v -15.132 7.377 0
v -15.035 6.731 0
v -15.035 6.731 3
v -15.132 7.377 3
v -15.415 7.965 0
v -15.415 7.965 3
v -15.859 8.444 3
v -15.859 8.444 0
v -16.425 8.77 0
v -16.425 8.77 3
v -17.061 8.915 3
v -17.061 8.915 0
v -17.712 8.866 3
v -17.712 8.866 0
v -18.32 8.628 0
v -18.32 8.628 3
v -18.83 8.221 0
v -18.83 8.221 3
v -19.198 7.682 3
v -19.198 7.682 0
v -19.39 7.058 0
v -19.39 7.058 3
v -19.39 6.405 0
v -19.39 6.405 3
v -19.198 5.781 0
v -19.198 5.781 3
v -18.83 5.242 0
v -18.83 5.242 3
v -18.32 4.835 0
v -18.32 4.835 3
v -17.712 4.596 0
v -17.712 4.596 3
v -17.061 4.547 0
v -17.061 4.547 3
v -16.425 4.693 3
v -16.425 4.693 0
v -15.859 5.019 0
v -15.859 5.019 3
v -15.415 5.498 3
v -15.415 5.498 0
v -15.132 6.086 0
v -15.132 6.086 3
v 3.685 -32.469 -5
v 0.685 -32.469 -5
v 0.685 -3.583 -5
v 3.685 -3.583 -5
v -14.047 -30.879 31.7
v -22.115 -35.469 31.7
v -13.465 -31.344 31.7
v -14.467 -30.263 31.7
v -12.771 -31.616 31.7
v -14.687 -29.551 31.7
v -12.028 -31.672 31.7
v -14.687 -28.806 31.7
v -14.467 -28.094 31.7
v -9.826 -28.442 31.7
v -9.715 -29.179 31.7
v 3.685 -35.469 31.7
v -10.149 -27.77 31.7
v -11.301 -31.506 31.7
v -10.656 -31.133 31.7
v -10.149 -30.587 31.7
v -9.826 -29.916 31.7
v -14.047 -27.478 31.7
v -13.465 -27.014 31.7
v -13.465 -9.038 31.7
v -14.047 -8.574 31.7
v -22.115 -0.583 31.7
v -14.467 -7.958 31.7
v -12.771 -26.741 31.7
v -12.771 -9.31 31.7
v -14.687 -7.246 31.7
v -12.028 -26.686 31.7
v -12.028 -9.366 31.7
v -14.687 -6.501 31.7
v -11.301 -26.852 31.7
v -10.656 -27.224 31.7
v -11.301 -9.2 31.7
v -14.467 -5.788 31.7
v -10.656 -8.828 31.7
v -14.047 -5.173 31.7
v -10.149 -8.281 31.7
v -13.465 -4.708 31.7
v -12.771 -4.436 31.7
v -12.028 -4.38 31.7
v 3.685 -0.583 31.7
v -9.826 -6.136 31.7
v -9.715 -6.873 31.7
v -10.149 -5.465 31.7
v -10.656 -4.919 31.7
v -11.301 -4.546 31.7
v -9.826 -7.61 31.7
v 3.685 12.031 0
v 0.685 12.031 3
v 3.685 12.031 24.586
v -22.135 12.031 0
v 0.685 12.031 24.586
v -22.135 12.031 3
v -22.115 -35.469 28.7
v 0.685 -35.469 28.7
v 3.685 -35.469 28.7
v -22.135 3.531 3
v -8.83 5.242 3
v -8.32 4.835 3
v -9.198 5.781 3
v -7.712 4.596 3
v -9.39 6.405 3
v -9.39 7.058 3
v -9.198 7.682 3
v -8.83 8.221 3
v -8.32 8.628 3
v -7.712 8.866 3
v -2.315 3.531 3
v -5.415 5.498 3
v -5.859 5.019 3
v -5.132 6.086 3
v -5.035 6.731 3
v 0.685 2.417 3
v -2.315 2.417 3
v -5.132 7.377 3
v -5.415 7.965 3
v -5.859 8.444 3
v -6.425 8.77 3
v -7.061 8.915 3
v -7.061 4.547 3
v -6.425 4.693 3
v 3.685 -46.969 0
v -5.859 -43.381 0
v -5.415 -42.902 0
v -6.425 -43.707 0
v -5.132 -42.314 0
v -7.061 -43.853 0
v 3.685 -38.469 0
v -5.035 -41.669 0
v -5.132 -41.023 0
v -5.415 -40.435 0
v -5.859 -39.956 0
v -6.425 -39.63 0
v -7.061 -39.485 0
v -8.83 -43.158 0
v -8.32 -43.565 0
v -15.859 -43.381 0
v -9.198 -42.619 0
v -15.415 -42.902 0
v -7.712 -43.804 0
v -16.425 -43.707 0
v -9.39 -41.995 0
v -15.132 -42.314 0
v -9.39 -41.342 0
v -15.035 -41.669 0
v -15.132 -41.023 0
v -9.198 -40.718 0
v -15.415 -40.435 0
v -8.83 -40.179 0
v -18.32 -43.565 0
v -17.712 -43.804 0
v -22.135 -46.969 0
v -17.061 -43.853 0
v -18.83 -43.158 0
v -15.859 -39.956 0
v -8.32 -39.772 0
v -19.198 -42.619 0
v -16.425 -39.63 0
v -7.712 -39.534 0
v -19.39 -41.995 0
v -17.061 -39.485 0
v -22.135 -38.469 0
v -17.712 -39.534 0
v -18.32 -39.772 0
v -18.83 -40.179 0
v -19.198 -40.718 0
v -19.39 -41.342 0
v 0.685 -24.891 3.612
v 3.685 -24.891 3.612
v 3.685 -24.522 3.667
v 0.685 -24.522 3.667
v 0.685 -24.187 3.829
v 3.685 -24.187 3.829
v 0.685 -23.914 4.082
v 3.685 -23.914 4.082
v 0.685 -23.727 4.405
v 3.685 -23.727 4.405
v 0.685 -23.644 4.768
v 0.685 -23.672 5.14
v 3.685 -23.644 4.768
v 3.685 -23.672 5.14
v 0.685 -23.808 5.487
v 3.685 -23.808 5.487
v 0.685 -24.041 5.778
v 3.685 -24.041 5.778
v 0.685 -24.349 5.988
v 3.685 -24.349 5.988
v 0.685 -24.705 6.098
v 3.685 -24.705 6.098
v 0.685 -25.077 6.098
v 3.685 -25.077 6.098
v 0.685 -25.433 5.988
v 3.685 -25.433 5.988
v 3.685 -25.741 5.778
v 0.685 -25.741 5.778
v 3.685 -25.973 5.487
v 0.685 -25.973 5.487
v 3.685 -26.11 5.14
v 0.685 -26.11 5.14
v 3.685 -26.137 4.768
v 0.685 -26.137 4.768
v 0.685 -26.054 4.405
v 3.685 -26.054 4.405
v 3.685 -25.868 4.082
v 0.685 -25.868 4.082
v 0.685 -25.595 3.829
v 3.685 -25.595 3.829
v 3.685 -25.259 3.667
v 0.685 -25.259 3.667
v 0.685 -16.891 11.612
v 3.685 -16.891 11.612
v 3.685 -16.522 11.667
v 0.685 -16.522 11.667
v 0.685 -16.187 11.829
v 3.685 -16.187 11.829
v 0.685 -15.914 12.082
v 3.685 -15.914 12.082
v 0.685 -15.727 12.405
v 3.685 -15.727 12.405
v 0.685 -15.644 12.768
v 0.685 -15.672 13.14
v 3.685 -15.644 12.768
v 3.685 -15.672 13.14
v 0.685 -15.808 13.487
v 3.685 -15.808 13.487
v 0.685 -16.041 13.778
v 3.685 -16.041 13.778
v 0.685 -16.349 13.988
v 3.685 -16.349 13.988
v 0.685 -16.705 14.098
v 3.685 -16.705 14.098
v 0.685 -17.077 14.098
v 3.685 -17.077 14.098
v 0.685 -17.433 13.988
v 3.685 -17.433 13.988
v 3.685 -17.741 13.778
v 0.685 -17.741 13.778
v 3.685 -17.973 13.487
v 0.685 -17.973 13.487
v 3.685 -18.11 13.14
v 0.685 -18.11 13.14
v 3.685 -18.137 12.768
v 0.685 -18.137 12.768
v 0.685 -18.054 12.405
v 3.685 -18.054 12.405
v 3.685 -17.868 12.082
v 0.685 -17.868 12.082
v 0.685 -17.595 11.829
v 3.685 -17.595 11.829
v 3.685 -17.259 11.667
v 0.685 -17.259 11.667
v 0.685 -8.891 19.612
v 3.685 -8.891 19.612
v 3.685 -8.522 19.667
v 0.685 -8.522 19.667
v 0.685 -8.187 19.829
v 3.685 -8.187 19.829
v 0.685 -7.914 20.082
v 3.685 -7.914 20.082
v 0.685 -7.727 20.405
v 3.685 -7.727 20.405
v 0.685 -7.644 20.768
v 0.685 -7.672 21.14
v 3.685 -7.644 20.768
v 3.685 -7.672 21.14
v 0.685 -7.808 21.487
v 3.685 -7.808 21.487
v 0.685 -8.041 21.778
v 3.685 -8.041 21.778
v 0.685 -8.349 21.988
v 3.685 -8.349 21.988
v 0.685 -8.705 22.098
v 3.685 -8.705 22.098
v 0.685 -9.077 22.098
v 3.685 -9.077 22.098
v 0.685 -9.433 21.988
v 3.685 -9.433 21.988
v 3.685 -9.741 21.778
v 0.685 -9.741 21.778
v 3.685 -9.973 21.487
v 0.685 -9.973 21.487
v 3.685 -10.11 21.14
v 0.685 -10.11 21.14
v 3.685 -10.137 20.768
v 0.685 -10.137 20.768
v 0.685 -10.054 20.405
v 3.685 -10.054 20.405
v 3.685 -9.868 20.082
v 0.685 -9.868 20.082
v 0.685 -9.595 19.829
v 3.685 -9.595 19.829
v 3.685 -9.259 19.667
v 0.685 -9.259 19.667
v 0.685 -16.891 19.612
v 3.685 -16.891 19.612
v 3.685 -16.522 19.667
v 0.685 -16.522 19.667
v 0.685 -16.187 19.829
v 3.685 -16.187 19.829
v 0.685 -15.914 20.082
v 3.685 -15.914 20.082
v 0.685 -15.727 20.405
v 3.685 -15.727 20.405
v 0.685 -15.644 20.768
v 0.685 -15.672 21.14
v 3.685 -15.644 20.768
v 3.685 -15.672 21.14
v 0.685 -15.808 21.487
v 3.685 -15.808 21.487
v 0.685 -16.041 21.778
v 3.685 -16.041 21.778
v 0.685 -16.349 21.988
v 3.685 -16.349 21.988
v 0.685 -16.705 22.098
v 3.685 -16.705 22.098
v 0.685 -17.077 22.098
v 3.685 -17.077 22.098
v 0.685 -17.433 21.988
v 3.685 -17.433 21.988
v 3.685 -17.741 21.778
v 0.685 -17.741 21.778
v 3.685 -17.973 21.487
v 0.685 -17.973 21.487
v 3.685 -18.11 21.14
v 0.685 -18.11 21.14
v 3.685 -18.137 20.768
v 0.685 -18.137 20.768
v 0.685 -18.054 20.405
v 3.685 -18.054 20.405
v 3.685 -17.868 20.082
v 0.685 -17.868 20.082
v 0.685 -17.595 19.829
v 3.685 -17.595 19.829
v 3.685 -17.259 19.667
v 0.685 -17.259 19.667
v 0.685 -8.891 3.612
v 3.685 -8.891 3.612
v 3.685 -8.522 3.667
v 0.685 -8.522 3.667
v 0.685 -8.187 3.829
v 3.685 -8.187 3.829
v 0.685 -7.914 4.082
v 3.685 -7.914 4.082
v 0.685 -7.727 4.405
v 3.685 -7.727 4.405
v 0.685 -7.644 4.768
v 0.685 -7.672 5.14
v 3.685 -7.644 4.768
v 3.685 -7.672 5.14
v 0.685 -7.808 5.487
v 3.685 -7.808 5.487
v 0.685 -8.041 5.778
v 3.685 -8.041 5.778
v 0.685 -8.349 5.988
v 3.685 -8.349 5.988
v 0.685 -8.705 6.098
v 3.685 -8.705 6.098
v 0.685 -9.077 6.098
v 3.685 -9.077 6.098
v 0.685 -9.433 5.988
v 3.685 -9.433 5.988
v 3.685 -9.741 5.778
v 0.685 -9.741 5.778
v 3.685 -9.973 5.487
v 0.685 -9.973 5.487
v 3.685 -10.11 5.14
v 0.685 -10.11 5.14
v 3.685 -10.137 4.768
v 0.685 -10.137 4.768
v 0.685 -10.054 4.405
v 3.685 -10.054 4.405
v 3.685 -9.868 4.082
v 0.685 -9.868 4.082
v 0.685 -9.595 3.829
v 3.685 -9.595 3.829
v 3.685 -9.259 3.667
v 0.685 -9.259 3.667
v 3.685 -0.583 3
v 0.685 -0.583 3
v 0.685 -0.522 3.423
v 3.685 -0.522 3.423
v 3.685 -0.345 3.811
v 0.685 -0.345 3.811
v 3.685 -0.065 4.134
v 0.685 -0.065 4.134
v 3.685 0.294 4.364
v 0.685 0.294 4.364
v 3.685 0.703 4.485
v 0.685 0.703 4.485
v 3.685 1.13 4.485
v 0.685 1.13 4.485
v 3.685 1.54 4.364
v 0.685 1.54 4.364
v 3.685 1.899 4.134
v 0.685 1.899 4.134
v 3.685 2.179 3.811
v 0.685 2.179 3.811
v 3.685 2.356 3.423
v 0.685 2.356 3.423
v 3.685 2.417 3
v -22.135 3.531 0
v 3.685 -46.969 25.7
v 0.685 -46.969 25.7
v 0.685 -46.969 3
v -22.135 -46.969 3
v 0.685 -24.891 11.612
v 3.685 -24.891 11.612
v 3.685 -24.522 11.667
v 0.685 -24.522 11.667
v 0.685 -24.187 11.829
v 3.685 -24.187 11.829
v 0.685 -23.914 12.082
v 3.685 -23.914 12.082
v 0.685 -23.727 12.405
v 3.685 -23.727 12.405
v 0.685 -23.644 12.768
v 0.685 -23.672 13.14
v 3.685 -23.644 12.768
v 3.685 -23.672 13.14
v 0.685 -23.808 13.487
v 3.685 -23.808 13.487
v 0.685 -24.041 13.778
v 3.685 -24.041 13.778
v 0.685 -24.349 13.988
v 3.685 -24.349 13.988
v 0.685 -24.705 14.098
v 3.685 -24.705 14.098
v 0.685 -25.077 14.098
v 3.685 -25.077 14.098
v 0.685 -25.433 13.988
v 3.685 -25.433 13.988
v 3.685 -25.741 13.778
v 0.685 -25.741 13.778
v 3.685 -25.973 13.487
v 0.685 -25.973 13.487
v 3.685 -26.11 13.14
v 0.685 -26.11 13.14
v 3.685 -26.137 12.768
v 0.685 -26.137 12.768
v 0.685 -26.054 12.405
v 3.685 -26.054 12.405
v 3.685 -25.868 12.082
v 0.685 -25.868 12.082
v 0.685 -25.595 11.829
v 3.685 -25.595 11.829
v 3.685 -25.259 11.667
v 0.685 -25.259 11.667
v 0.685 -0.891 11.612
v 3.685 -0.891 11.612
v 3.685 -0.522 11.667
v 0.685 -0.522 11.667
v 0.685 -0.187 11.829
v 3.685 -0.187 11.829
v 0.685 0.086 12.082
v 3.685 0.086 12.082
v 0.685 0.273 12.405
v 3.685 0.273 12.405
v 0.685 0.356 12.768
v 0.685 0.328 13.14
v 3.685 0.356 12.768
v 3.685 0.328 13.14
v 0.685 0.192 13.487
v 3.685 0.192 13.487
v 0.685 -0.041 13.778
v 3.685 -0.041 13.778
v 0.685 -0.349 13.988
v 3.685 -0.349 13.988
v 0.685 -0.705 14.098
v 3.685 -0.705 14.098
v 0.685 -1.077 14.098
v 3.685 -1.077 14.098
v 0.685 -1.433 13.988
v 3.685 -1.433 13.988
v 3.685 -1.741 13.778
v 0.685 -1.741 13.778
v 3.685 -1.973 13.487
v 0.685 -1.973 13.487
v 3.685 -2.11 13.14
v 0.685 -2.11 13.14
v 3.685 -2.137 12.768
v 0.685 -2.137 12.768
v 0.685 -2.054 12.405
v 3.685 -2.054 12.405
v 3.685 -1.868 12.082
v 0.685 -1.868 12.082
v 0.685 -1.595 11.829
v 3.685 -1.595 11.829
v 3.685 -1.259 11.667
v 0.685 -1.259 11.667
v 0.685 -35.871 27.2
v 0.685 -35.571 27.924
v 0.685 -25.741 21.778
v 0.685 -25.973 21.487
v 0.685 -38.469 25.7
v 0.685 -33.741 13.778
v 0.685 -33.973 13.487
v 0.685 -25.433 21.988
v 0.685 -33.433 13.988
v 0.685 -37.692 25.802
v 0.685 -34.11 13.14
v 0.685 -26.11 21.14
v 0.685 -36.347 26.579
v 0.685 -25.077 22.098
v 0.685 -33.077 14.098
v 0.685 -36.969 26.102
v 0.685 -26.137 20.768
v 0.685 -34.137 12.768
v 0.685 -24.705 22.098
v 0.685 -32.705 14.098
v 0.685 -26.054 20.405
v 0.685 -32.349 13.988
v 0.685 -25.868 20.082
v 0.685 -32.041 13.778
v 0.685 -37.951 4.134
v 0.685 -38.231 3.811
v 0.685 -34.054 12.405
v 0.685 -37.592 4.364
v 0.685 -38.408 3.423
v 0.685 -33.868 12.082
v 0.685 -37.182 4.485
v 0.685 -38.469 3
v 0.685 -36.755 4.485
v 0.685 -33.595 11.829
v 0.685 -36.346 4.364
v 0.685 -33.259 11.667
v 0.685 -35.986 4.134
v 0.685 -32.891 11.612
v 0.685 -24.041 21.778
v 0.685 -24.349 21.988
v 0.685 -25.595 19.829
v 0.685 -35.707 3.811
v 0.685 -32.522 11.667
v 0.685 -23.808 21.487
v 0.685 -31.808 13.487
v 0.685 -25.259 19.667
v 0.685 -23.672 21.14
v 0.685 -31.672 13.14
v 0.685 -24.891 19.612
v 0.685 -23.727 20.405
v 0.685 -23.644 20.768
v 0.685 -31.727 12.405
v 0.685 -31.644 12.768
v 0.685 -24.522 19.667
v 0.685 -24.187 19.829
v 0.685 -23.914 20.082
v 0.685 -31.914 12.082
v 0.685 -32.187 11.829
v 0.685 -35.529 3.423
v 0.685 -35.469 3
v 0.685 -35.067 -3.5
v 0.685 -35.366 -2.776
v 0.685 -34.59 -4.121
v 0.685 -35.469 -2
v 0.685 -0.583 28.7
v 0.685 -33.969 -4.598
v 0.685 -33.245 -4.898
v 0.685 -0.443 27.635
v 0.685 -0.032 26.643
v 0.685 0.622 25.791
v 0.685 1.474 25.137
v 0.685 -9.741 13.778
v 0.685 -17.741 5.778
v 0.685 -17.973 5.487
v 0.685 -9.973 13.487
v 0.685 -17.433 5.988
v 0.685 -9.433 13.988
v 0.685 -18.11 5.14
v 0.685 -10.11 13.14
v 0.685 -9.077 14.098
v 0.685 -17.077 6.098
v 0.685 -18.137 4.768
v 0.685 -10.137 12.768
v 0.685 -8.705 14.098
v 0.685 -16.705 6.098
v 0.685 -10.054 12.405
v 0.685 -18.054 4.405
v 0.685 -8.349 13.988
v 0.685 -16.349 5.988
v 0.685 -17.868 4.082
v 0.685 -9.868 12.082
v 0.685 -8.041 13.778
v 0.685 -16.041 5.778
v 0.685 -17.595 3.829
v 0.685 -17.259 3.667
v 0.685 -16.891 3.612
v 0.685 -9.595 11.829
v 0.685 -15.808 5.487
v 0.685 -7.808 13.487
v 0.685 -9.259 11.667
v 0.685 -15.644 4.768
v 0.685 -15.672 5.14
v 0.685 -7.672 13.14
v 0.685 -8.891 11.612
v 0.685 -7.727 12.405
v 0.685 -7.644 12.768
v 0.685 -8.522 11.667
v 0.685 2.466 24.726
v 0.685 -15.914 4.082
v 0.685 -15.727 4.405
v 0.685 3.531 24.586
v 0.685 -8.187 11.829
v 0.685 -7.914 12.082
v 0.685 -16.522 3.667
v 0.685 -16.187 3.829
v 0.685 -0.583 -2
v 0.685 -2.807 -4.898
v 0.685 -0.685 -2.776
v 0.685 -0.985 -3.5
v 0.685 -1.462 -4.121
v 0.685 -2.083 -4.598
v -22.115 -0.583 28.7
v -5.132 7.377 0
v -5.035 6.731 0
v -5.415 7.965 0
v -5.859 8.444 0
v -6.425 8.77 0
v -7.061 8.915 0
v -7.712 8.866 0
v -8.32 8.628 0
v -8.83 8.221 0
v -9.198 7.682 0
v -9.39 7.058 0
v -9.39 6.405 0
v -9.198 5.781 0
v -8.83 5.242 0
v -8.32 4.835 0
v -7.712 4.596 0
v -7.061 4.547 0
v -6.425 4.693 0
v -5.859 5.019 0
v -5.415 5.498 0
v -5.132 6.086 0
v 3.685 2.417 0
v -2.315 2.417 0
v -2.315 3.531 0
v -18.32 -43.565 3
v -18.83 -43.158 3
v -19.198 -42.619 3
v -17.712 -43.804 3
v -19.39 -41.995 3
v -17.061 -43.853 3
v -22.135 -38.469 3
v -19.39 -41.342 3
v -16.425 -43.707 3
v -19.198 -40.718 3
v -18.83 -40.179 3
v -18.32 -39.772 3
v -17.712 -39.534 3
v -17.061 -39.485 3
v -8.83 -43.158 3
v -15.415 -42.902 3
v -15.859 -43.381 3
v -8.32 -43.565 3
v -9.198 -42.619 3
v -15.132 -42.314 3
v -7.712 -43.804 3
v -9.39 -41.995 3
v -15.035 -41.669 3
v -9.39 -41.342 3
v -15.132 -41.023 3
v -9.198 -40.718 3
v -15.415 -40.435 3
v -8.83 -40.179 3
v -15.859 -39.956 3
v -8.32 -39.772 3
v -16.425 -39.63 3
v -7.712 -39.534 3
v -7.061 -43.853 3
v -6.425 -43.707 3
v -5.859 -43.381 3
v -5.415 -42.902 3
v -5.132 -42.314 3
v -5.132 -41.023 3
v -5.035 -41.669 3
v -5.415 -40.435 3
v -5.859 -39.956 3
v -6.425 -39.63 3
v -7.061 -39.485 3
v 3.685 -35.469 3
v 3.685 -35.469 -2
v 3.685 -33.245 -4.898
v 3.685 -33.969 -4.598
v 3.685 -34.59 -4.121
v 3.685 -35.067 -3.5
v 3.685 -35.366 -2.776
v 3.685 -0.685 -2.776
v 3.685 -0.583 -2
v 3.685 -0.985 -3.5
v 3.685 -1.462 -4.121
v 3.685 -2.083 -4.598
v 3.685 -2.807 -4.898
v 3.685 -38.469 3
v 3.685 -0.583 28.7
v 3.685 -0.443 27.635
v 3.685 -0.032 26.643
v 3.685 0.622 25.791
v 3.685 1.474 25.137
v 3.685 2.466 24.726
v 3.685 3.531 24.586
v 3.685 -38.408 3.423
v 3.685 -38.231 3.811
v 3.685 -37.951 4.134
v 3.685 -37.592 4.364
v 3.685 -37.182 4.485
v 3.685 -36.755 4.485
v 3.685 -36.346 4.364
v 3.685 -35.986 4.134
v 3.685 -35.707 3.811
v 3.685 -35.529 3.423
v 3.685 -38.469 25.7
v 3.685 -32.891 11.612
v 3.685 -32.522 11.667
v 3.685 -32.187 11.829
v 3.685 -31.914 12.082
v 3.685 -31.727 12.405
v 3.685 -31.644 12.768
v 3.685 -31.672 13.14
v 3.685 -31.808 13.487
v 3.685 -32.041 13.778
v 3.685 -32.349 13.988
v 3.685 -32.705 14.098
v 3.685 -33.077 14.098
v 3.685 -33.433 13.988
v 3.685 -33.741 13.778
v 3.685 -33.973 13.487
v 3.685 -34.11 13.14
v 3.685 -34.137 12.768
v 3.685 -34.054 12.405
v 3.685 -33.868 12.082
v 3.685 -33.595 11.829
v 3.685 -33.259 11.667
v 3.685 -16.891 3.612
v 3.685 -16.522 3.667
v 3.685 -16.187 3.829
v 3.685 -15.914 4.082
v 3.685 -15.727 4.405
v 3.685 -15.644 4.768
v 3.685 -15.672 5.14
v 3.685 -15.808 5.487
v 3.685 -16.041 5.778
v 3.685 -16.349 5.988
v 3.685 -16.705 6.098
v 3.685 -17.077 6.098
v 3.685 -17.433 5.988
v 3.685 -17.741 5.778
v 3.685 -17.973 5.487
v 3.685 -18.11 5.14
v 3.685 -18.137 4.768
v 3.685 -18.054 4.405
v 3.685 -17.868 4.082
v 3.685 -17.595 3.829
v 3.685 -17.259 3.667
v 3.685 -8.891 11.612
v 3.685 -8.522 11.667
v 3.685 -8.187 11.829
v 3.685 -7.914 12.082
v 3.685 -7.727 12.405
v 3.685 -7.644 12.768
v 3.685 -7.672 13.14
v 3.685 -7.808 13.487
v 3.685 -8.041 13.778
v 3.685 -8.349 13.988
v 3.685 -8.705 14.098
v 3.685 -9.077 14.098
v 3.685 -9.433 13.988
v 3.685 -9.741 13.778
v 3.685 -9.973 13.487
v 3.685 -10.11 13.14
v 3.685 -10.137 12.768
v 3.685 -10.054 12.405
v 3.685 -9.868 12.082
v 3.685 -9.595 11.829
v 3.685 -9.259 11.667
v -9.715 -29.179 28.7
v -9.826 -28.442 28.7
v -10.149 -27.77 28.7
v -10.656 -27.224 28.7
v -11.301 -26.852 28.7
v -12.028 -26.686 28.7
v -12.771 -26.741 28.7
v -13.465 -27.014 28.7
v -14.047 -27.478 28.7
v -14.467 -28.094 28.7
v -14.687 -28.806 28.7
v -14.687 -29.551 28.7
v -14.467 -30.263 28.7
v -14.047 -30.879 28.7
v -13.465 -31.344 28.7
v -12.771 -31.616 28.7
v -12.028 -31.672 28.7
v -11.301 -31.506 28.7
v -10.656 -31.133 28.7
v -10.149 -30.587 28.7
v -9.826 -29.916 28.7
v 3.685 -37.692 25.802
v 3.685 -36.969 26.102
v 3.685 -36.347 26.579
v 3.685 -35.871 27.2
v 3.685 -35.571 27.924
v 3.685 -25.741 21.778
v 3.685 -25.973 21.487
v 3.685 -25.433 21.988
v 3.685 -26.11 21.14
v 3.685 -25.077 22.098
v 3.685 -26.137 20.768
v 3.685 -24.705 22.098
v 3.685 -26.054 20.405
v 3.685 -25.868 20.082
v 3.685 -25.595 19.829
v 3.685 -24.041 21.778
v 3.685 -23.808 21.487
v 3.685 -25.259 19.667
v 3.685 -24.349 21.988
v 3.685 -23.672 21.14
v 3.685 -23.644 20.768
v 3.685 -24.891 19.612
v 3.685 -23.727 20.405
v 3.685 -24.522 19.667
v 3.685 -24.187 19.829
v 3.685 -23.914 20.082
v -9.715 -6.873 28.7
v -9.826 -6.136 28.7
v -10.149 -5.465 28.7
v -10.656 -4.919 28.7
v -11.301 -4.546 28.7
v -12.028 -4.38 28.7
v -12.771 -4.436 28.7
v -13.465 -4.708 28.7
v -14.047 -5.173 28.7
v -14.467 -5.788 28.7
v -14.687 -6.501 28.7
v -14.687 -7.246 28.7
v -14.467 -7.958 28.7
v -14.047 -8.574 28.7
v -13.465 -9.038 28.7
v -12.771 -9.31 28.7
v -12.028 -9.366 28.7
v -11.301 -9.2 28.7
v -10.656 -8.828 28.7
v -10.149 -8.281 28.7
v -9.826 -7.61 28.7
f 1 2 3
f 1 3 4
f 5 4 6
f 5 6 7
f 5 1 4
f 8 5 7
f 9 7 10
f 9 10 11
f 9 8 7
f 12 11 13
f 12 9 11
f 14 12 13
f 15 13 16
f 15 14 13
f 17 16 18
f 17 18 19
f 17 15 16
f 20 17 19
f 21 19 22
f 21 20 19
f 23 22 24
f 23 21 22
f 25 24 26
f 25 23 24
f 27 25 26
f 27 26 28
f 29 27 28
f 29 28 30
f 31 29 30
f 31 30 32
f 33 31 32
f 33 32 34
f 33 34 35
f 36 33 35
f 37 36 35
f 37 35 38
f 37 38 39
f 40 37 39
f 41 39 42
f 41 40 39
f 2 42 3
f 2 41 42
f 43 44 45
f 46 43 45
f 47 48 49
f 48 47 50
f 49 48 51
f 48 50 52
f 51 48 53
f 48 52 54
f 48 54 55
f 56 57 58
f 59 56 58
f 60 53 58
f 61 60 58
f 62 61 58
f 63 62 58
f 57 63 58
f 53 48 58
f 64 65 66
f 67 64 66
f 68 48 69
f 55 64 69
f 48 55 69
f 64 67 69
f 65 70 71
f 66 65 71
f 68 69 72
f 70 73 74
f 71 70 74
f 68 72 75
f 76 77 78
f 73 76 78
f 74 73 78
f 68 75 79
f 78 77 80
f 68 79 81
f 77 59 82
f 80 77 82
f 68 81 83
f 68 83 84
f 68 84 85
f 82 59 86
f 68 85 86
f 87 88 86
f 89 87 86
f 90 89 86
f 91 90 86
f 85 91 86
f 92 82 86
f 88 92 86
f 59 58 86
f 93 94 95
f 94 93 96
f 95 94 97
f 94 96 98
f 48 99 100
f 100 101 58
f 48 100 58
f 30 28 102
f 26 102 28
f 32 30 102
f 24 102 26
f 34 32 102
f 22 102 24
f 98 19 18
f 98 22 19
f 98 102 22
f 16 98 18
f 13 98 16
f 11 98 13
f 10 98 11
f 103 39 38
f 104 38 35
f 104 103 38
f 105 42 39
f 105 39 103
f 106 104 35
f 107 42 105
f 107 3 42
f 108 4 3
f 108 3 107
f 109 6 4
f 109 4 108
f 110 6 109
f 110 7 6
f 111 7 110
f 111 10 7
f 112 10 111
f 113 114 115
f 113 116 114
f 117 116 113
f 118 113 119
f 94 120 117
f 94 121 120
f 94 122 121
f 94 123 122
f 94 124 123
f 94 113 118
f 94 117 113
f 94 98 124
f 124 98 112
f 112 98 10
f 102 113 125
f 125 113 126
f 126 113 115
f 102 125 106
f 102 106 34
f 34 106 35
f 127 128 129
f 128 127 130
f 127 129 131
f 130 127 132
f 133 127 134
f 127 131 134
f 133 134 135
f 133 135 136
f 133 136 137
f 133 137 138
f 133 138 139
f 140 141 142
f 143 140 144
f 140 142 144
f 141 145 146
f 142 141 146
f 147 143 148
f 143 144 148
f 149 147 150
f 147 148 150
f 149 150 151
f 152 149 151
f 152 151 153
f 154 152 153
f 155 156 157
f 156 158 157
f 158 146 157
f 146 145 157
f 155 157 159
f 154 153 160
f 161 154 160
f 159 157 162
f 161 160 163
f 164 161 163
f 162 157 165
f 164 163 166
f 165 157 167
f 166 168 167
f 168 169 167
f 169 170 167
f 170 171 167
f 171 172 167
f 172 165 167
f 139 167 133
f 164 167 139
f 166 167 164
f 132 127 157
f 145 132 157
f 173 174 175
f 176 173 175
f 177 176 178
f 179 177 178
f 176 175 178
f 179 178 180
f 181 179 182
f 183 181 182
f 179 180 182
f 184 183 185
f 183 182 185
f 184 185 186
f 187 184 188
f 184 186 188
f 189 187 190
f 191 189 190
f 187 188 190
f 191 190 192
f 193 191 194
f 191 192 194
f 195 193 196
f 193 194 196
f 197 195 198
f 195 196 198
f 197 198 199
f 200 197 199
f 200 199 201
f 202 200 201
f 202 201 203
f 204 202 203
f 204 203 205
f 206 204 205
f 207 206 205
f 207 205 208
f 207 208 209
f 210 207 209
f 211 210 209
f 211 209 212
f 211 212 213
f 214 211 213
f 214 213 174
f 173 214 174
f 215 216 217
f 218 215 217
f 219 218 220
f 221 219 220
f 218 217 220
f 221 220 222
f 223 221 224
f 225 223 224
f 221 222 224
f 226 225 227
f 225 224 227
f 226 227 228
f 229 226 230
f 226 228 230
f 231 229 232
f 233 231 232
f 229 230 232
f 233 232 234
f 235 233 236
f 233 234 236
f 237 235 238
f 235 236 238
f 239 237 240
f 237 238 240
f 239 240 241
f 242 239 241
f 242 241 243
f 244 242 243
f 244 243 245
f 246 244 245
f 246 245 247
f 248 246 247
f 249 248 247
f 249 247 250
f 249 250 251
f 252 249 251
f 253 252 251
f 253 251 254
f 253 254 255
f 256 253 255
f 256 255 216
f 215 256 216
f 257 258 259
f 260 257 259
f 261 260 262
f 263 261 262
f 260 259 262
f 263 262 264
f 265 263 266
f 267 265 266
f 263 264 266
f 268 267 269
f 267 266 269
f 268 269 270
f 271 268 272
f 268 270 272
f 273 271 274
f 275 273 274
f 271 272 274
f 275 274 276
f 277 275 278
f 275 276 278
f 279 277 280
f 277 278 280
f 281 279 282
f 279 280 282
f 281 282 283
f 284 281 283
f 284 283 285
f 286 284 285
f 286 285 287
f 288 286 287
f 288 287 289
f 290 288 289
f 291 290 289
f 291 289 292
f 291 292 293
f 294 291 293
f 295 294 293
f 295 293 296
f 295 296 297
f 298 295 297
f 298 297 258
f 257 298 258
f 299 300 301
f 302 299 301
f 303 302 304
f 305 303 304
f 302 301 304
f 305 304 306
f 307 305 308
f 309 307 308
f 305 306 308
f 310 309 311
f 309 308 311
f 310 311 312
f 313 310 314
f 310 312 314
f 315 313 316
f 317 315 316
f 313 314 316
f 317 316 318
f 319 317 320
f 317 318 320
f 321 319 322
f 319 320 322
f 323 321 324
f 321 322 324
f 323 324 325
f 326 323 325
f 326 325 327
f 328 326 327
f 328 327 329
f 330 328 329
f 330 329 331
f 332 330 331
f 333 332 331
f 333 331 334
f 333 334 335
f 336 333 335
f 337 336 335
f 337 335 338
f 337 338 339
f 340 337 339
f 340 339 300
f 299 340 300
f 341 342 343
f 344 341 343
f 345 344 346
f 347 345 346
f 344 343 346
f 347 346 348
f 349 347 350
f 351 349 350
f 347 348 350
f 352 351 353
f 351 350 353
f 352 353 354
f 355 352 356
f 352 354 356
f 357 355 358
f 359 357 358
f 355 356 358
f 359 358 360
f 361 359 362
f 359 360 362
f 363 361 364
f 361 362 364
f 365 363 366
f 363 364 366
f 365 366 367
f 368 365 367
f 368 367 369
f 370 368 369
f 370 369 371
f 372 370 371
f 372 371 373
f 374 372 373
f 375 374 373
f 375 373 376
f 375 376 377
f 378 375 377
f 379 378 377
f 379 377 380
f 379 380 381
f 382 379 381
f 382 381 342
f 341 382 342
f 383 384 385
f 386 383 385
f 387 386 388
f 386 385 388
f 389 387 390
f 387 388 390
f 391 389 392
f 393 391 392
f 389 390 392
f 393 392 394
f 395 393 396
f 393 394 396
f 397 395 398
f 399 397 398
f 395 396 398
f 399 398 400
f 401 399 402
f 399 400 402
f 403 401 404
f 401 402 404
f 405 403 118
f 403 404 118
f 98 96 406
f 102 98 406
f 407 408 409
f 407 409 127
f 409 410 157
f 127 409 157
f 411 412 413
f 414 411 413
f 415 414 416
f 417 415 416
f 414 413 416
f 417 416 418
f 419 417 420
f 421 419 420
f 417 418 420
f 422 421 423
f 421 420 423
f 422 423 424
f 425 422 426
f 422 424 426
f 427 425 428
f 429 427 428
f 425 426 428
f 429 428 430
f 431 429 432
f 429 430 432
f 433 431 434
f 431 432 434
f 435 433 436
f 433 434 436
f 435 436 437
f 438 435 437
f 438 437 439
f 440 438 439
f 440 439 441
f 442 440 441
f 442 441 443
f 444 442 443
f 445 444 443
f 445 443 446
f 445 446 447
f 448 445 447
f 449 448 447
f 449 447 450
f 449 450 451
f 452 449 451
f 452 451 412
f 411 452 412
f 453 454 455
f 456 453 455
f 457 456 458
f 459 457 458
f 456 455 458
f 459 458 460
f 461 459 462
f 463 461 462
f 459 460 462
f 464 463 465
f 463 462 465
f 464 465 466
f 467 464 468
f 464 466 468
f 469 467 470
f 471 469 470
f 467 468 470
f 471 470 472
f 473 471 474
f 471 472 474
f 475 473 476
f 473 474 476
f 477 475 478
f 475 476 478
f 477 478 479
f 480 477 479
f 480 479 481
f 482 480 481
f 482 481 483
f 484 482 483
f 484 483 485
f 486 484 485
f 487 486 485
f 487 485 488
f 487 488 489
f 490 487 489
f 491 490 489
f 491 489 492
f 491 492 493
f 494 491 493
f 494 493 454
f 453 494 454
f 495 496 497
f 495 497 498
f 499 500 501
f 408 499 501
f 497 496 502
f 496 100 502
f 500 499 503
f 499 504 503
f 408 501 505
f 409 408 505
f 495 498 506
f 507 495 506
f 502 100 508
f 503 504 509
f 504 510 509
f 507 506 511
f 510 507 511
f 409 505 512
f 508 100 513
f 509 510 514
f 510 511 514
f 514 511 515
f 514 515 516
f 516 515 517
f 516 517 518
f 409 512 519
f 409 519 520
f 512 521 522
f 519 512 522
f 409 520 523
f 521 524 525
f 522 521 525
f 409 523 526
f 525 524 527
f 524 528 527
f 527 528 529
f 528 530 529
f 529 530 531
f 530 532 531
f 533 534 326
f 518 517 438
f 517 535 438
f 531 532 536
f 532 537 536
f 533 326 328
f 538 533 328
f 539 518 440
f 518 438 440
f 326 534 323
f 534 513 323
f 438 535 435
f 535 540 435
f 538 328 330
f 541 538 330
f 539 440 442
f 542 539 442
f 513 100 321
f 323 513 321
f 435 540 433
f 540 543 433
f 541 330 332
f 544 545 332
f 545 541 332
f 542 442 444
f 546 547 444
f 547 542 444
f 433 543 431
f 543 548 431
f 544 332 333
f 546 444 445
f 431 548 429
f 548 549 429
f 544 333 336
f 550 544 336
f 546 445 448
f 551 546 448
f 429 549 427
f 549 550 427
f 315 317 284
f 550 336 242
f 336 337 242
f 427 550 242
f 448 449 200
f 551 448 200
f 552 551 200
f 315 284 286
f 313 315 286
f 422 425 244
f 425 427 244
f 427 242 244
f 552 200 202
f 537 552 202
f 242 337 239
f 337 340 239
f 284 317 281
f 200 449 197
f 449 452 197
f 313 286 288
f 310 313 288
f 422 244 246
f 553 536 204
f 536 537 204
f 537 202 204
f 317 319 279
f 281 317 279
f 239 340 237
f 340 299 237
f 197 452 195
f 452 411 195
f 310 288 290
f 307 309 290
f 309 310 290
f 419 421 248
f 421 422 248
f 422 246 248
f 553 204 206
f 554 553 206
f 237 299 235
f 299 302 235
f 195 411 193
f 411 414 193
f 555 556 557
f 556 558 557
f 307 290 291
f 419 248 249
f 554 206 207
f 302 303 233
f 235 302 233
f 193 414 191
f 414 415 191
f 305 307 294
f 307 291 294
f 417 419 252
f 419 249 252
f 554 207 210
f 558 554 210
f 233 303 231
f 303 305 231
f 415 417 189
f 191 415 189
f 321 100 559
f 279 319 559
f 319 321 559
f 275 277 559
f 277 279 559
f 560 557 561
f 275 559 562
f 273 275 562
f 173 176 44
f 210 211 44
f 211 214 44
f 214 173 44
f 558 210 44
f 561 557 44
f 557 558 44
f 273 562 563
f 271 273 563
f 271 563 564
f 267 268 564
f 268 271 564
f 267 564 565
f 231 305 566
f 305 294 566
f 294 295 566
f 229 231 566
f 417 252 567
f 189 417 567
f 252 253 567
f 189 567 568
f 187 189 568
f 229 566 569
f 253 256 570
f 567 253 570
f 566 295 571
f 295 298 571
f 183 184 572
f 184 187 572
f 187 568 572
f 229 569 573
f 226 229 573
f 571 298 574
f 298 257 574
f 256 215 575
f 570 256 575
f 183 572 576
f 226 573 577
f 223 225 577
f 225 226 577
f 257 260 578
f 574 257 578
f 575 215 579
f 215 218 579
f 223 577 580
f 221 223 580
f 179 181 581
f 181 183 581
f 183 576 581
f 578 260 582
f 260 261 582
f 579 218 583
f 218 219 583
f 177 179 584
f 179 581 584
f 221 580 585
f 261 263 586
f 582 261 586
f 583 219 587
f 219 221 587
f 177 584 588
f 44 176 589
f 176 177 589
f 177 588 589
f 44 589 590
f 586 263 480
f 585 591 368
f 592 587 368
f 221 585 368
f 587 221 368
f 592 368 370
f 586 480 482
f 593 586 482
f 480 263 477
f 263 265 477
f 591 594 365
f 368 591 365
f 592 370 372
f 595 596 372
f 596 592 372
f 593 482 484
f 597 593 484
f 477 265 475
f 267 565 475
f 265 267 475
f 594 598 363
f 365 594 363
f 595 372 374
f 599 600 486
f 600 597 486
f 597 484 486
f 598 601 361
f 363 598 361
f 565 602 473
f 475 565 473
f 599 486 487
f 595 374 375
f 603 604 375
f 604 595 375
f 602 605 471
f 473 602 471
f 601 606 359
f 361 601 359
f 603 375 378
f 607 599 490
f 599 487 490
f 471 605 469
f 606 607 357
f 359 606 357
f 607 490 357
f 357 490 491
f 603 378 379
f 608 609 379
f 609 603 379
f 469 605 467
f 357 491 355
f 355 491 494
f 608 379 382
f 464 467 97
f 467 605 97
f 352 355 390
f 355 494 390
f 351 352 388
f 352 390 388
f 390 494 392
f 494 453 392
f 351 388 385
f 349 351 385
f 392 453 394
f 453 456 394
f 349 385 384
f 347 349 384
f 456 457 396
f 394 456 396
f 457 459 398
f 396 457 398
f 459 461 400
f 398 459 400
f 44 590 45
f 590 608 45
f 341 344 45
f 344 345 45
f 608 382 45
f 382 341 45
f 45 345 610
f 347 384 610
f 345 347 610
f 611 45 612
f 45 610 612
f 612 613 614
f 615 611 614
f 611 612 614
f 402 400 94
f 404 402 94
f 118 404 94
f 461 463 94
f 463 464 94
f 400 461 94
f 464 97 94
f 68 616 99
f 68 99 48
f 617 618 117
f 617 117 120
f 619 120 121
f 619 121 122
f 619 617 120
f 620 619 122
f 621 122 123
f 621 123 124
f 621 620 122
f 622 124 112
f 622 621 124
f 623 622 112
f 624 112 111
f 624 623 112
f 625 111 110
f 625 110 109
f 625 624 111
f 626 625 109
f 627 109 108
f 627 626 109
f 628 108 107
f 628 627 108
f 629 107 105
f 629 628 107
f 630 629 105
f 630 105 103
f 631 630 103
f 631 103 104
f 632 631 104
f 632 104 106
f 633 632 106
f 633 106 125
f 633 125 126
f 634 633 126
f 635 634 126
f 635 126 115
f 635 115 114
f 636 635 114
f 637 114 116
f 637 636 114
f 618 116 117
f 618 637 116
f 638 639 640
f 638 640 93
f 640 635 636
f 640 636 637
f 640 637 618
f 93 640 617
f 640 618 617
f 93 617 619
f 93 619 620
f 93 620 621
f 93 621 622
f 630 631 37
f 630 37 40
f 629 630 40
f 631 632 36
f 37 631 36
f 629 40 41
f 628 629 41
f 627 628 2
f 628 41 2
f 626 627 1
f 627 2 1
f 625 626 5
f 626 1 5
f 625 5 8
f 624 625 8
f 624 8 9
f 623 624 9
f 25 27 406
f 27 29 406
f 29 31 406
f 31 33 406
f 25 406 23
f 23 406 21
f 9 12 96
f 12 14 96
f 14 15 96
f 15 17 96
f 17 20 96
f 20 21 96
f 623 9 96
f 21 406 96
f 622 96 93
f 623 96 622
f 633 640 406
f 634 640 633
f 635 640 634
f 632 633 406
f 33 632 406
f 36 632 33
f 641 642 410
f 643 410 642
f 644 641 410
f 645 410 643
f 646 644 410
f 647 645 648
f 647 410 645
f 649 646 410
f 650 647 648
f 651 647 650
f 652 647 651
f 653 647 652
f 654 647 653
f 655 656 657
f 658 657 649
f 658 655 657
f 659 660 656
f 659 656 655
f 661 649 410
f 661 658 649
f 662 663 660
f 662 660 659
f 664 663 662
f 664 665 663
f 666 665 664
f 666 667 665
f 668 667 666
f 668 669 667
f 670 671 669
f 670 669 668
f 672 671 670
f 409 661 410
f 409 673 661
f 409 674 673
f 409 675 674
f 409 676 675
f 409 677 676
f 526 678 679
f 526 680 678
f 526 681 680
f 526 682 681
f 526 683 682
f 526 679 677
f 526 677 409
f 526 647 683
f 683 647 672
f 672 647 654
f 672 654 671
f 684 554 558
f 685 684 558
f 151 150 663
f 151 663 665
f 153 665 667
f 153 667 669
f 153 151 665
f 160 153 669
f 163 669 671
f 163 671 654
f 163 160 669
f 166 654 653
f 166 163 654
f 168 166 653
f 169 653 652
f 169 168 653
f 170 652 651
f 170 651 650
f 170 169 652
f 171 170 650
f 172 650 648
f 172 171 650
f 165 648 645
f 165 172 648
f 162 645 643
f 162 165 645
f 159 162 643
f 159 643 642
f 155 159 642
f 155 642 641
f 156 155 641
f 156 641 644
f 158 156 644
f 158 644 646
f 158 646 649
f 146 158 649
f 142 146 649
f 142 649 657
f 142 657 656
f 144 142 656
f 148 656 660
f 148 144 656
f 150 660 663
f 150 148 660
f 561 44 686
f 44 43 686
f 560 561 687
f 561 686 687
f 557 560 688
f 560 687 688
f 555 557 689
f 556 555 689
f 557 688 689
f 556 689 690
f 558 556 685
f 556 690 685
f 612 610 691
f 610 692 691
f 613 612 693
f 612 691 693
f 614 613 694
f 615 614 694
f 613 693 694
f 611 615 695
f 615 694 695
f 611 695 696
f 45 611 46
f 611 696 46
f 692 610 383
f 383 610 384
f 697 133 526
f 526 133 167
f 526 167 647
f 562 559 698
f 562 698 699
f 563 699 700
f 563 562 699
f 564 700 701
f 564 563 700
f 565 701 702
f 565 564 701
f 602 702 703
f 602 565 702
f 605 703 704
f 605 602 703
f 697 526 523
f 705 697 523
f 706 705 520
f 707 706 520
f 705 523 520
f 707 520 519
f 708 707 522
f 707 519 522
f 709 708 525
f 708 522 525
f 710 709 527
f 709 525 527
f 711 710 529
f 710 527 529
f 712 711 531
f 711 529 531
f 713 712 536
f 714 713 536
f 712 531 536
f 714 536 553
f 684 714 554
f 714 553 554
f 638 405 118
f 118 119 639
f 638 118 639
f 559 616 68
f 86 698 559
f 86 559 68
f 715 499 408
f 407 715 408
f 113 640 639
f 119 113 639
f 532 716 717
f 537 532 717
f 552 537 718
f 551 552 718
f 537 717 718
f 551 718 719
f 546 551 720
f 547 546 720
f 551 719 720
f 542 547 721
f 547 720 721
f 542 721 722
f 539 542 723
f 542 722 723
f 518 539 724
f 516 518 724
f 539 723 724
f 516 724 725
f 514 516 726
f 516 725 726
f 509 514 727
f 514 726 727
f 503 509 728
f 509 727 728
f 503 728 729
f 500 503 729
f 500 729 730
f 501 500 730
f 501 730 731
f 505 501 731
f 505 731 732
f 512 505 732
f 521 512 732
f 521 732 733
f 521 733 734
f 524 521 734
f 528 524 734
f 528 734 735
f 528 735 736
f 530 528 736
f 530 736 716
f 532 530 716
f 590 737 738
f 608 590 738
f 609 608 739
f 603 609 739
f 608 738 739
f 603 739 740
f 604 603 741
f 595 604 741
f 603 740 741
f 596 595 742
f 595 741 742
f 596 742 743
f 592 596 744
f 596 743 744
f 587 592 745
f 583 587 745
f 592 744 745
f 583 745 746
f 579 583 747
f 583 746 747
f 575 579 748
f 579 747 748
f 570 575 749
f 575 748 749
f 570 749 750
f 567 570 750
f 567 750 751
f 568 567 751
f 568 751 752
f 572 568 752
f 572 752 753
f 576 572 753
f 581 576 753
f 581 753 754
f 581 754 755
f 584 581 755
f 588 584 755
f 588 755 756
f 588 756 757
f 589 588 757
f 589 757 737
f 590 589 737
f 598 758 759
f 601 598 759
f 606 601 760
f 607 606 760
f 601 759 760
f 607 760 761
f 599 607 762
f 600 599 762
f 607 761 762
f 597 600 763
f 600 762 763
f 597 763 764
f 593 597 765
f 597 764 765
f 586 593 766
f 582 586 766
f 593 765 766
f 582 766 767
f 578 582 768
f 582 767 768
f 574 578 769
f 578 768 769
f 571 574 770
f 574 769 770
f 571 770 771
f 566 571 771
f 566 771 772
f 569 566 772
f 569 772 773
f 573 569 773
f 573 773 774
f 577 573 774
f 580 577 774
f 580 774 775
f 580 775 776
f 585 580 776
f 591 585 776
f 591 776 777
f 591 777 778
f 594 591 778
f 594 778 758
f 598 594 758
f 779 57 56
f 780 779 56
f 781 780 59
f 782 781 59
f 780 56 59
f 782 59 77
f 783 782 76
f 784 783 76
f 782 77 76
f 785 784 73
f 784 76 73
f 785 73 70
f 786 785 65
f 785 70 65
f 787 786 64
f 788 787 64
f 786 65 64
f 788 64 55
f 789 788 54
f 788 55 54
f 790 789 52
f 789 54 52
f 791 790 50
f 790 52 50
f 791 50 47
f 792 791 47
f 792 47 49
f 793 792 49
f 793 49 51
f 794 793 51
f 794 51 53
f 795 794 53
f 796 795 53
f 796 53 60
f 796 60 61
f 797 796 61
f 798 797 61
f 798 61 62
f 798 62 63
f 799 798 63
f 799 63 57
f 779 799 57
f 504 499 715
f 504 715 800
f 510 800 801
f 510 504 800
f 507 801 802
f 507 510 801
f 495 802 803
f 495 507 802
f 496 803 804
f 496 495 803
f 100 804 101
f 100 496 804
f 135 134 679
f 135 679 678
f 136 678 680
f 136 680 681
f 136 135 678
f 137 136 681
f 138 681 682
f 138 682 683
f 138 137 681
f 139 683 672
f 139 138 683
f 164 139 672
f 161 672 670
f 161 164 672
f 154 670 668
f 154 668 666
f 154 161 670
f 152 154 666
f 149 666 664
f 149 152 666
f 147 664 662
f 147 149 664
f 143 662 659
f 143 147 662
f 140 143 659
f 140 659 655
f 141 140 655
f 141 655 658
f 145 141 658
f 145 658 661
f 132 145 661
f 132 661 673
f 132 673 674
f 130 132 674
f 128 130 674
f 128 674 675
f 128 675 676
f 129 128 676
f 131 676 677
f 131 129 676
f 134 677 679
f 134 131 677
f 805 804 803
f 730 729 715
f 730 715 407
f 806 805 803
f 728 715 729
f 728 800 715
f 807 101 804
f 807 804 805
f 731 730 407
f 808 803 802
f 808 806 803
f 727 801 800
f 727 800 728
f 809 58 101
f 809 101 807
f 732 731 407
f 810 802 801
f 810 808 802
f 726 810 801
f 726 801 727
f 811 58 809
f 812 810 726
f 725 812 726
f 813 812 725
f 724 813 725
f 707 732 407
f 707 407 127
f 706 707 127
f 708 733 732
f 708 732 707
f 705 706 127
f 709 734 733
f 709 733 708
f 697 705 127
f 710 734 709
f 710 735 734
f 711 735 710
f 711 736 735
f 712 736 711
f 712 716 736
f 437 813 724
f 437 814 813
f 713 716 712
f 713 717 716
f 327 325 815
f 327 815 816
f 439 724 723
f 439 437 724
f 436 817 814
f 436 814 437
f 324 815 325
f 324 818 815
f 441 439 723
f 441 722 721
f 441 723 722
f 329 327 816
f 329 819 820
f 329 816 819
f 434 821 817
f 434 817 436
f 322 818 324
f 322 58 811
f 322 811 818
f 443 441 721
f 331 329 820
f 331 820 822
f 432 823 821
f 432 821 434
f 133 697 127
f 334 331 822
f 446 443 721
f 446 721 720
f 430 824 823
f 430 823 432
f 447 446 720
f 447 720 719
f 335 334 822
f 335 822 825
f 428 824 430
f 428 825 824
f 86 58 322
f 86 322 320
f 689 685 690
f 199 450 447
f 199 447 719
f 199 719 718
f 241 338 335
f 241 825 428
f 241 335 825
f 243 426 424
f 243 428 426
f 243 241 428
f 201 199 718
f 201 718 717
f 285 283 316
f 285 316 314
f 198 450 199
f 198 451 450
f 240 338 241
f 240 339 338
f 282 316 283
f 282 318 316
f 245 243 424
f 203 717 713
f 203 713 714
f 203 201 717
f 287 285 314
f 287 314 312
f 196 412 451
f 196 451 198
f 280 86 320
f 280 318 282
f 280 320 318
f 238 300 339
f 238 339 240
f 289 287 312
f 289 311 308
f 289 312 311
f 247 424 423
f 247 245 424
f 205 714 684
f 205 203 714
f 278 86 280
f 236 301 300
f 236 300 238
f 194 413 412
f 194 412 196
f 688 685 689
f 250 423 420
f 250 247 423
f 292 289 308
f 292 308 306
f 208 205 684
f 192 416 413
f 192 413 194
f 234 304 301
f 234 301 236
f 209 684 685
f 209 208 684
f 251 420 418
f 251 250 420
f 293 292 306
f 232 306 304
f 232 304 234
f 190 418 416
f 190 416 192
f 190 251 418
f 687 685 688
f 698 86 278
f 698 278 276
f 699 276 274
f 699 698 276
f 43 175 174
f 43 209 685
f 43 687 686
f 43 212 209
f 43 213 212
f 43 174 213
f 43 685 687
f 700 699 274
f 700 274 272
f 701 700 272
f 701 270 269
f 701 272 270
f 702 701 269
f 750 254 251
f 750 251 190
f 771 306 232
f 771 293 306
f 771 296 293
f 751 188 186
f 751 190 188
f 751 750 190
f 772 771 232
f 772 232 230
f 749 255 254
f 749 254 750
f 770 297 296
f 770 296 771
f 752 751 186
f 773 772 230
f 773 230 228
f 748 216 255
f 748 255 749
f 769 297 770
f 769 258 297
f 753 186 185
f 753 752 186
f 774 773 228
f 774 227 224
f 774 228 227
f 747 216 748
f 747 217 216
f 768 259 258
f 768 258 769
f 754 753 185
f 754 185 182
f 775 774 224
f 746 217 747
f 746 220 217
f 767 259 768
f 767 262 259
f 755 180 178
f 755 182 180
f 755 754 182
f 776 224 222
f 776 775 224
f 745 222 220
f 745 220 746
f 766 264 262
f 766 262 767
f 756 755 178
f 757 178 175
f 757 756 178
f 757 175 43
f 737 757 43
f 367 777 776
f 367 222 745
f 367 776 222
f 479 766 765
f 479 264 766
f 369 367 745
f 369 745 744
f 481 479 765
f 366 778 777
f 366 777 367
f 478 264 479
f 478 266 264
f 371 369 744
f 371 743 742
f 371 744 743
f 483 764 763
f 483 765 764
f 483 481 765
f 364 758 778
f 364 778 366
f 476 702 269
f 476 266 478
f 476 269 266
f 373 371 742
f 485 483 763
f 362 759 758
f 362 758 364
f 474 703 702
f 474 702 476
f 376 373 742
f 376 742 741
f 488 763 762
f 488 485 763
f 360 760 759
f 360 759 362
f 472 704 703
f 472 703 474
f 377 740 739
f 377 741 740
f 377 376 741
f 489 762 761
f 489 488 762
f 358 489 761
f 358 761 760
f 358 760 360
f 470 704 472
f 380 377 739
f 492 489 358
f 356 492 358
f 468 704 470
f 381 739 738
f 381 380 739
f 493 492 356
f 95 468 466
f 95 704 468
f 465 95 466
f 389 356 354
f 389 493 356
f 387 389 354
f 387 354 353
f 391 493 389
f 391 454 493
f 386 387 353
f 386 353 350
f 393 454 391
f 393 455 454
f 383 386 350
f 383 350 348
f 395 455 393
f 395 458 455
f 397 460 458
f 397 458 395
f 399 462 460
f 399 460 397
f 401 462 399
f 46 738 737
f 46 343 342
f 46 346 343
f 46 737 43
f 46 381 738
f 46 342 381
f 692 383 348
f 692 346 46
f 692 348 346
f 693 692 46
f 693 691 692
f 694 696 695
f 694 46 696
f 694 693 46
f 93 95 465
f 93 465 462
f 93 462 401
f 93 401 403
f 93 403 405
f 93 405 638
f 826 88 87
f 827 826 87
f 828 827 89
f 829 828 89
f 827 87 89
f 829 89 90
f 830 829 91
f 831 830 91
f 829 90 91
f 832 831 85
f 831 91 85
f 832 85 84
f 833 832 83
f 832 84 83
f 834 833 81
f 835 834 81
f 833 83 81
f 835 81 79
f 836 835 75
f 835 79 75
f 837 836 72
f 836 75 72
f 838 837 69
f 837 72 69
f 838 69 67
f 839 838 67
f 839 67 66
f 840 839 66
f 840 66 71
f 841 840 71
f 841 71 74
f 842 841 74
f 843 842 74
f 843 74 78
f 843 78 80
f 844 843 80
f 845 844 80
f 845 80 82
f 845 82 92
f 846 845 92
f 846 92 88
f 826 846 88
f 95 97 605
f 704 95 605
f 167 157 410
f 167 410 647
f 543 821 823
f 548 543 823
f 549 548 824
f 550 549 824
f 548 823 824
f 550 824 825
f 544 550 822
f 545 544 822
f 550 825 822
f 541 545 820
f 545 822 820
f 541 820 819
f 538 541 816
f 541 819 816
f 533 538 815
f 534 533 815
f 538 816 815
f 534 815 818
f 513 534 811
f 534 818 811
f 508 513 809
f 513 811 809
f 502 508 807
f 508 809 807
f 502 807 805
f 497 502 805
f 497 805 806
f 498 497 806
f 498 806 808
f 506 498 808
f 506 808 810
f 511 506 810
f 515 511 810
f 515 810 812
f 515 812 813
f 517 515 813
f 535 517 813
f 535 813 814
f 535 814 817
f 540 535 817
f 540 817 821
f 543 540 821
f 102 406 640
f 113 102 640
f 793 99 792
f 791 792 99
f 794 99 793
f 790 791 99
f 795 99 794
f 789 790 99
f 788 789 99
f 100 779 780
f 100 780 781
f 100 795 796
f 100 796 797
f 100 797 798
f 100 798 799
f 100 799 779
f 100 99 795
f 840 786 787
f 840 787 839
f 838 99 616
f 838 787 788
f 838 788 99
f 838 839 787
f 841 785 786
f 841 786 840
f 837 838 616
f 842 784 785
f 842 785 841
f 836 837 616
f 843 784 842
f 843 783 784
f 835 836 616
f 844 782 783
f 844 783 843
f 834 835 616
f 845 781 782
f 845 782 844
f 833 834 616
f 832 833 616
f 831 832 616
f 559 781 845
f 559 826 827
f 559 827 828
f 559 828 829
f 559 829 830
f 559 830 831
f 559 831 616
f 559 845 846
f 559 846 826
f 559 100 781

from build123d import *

# Parameters (mm, degrees)
ESQUISSE1_R             = 2.19
BOSS_EXTRU_2_DEPTH      = 3
ESQUISSE1_W             = 22.82
ESQUISSE1_H             = 8.5
BOSS_EXTRU_2_2_DEPTH    = 3
BOSS_EXTRU_4_DEPTH      = 3
CONG_1_R                = 3
ESQUISSE4_W             = 3
ESQUISSE4_H             = 9.614426754
BOSS_EXTRU_5_DEPTH      = 5
ENL_V_MAT_EXTRU_1_DEPTH = 5
ESQUISSE15_W            = 3
ESQUISSE15_H            = 34.885573246
BOSS_EXTRU_6_DEPTH      = 22.8
ESQUISSE17_R            = 1.25
ENL_V_MAT_EXTRU_2_DEPTH = 4
ESQUISSE19_R            = 2.5
ENL_V_MAT_EXTRU_5_DEPTH = 4


with BuildPart() as part:
    # Esquisse1 → Boss.-Extru.2 (new body)
    with BuildSketch(Plane.XY):
        Polygon((-22.134709342, 12.031312967), (-22.134709342, 3.531312967), (-2.314709342, 3.531312967), (-2.314709342, 2.416886213), (0.685290658, 2.416886213), (0.685290658, 12.031312967), align=None)
        with Locations((-17.224709342, 6.731312967)):
            Circle(ESQUISSE1_R, mode=Mode.SUBTRACT)
        with Locations((-7.224709342, 6.731312967)):
            Circle(ESQUISSE1_R, mode=Mode.SUBTRACT)
    extrude(amount=BOSS_EXTRU_2_DEPTH)



with BuildPart() as body_2:
    # Esquisse1 → Boss.-Extru.2 2 (new body)
    with BuildSketch(Plane.XY):
        with Locations((-10.724709342, -42.718687033)):
            Rectangle(ESQUISSE1_W, ESQUISSE1_H)
        with Locations((-17.224709342, -41.668687033)):
            Circle(ESQUISSE1_R, mode=Mode.SUBTRACT)
        with Locations((-7.224709342, -41.668687033)):
            Circle(ESQUISSE1_R, mode=Mode.SUBTRACT)
    extrude(amount=BOSS_EXTRU_2_2_DEPTH)

    # Esquisse3 → Boss.-Extru.4 (add)
    with BuildSketch(Plane(origin=(0.685290658, 0, 0), x_dir=(0, 0, -1), z_dir=(1, 0, 0))):
        with BuildLine():
            Line((0, 2.416886213), (0, 12.031312967))
            Line((0, 12.031312967), (-31.7, 12.031312967))
            Line((-31.7, 12.031312967), (-31.7, -46.968687033))
            Line((-31.7, -46.968687033), (0, -46.968687033))
            Line((0, -46.968687033), (0, -38.468687033))
            Line((0, -38.468687033), (-3, -38.468687033))
            ThreePointArc((-3, -38.468687033), (-4.5, -36.968687033), (-3, -35.468687033))
            Line((-3, -35.468687033), (5, -35.468687033))
            Line((5, -35.468687033), (5, -0.583113787))
            Line((5, -0.583113787), (-3, -0.583113787))
            ThreePointArc((-3, -0.583113787), (-4.5, 0.916886213), (-3, 2.416886213))
            Line((-3, 2.416886213), (0, 2.416886213))
        make_face()
    extrude(amount=BOSS_EXTRU_4_DEPTH)

    # Congé1
    cong_1_edges = [body_2.edges().sort_by_distance(p)[0] for p in [
        (2.185290658, -35.468687033, -5),
        (2.185290658, -0.583113787, -5),
    ]]
    fillet(cong_1_edges, radius=CONG_1_R)


with BuildPart() as part_1:
    add(part.part)

    add(body_2.part)  # Boss.-Extru.5 merges body 2
    # Esquisse4 → Boss.-Extru.5 (add)
    with BuildSketch(Plane(origin=(3.685290658, 0, 0), x_dir=(0, 0, -1), z_dir=(1, 0, 0))):
        with Locations((-1.5, 7.22409959)):
            Rectangle(ESQUISSE4_W, ESQUISSE4_H)
    extrude(amount=-BOSS_EXTRU_5_DEPTH)

    # Esquisse13 → Enlèv. mat.-Extru.1 (cut)
    with BuildSketch(Plane.ZY.offset(-0.685290658)):
        Polygon((28.7, -0.583113787), (31.7, -0.583113787), (31.7, 12.031312967), (24.585573245, 12.031312967), (24.585573245, 3.531312967), (28.7, 3.531312967), align=None)
        with BuildLine():
            ThreePointArc((28.7, -0.583113787), (25.790660941, 0.621973908), (24.585573245, 3.531312967))
            Line((24.585573245, 3.531312967), (28.7, 3.531312967))
            Line((28.7, 3.531312967), (28.7, -0.583113787))
        make_face()
        Polygon((31.7, -46.968687033), (31.7, -35.468687033), (28.7, -35.468687033), (28.7, -38.468687033), (25.7, -38.468687033), (25.7, -46.968687033), align=None)
        with BuildLine():
            ThreePointArc((25.7, -38.468687033), (26.578679656, -36.347366689), (28.7, -35.468687033))
            Line((28.7, -35.468687033), (28.7, -38.468687033))
            Line((28.7, -38.468687033), (25.7, -38.468687033))
        make_face()
    extrude(amount=-ENL_V_MAT_EXTRU_1_DEPTH, mode=Mode.SUBTRACT)

    # Esquisse15 → Boss.-Extru.6 (add)
    with BuildSketch(Plane.ZY.offset(-0.685290658)):
        with Locations((30.2, -18.02590041)):
            Rectangle(ESQUISSE15_W, ESQUISSE15_H)
    extrude(amount=BOSS_EXTRU_6_DEPTH)

    # Esquisse17 → Enlèv. mat.-Extru.2 (cut)
    with BuildSketch(Plane(origin=(3.685290658, 0, 0), x_dir=(0, 0, -1), z_dir=(1, 0, 0))):
        with Locations((-20.861566887, -16.89090041)):
            Circle(ESQUISSE17_R)
        with Locations((-20.861566887, -24.89090041)):
            Circle(ESQUISSE17_R)
        with Locations((-12.861566887, -24.89090041)):
            Circle(ESQUISSE17_R)
        with Locations((-4.861566887, -24.89090041)):
            Circle(ESQUISSE17_R)
        with Locations((-4.861566887, -16.89090041)):
            Circle(ESQUISSE17_R)
        with Locations((-4.861566887, -8.89090041)):
            Circle(ESQUISSE17_R)
        with Locations((-12.861566887, -8.89090041)):
            Circle(ESQUISSE17_R)
        with Locations((-20.861566887, -8.89090041)):
            Circle(ESQUISSE17_R)
        with Locations((-12.861566887, -0.89090041)):
            Circle(ESQUISSE17_R)
        with Locations((-12.861566887, -32.89090041)):
            Circle(ESQUISSE17_R)
        with Locations((-12.861566887, -16.89090041)):
            Circle(ESQUISSE17_R)
    extrude(amount=-ENL_V_MAT_EXTRU_2_DEPTH, mode=Mode.SUBTRACT)

    # Esquisse19 → Enlèv. mat.-Extru.5 (cut)
    with BuildSketch(Plane.XY.offset(31.7)):
        with Locations((-12.214709342, -6.873113787)):
            Circle(ESQUISSE19_R)
        with Locations((-12.214709342, -29.178687033)):
            Circle(ESQUISSE19_R)
    extrude(amount=-ENL_V_MAT_EXTRU_5_DEPTH, mode=Mode.SUBTRACT)


solid = part_1.part
